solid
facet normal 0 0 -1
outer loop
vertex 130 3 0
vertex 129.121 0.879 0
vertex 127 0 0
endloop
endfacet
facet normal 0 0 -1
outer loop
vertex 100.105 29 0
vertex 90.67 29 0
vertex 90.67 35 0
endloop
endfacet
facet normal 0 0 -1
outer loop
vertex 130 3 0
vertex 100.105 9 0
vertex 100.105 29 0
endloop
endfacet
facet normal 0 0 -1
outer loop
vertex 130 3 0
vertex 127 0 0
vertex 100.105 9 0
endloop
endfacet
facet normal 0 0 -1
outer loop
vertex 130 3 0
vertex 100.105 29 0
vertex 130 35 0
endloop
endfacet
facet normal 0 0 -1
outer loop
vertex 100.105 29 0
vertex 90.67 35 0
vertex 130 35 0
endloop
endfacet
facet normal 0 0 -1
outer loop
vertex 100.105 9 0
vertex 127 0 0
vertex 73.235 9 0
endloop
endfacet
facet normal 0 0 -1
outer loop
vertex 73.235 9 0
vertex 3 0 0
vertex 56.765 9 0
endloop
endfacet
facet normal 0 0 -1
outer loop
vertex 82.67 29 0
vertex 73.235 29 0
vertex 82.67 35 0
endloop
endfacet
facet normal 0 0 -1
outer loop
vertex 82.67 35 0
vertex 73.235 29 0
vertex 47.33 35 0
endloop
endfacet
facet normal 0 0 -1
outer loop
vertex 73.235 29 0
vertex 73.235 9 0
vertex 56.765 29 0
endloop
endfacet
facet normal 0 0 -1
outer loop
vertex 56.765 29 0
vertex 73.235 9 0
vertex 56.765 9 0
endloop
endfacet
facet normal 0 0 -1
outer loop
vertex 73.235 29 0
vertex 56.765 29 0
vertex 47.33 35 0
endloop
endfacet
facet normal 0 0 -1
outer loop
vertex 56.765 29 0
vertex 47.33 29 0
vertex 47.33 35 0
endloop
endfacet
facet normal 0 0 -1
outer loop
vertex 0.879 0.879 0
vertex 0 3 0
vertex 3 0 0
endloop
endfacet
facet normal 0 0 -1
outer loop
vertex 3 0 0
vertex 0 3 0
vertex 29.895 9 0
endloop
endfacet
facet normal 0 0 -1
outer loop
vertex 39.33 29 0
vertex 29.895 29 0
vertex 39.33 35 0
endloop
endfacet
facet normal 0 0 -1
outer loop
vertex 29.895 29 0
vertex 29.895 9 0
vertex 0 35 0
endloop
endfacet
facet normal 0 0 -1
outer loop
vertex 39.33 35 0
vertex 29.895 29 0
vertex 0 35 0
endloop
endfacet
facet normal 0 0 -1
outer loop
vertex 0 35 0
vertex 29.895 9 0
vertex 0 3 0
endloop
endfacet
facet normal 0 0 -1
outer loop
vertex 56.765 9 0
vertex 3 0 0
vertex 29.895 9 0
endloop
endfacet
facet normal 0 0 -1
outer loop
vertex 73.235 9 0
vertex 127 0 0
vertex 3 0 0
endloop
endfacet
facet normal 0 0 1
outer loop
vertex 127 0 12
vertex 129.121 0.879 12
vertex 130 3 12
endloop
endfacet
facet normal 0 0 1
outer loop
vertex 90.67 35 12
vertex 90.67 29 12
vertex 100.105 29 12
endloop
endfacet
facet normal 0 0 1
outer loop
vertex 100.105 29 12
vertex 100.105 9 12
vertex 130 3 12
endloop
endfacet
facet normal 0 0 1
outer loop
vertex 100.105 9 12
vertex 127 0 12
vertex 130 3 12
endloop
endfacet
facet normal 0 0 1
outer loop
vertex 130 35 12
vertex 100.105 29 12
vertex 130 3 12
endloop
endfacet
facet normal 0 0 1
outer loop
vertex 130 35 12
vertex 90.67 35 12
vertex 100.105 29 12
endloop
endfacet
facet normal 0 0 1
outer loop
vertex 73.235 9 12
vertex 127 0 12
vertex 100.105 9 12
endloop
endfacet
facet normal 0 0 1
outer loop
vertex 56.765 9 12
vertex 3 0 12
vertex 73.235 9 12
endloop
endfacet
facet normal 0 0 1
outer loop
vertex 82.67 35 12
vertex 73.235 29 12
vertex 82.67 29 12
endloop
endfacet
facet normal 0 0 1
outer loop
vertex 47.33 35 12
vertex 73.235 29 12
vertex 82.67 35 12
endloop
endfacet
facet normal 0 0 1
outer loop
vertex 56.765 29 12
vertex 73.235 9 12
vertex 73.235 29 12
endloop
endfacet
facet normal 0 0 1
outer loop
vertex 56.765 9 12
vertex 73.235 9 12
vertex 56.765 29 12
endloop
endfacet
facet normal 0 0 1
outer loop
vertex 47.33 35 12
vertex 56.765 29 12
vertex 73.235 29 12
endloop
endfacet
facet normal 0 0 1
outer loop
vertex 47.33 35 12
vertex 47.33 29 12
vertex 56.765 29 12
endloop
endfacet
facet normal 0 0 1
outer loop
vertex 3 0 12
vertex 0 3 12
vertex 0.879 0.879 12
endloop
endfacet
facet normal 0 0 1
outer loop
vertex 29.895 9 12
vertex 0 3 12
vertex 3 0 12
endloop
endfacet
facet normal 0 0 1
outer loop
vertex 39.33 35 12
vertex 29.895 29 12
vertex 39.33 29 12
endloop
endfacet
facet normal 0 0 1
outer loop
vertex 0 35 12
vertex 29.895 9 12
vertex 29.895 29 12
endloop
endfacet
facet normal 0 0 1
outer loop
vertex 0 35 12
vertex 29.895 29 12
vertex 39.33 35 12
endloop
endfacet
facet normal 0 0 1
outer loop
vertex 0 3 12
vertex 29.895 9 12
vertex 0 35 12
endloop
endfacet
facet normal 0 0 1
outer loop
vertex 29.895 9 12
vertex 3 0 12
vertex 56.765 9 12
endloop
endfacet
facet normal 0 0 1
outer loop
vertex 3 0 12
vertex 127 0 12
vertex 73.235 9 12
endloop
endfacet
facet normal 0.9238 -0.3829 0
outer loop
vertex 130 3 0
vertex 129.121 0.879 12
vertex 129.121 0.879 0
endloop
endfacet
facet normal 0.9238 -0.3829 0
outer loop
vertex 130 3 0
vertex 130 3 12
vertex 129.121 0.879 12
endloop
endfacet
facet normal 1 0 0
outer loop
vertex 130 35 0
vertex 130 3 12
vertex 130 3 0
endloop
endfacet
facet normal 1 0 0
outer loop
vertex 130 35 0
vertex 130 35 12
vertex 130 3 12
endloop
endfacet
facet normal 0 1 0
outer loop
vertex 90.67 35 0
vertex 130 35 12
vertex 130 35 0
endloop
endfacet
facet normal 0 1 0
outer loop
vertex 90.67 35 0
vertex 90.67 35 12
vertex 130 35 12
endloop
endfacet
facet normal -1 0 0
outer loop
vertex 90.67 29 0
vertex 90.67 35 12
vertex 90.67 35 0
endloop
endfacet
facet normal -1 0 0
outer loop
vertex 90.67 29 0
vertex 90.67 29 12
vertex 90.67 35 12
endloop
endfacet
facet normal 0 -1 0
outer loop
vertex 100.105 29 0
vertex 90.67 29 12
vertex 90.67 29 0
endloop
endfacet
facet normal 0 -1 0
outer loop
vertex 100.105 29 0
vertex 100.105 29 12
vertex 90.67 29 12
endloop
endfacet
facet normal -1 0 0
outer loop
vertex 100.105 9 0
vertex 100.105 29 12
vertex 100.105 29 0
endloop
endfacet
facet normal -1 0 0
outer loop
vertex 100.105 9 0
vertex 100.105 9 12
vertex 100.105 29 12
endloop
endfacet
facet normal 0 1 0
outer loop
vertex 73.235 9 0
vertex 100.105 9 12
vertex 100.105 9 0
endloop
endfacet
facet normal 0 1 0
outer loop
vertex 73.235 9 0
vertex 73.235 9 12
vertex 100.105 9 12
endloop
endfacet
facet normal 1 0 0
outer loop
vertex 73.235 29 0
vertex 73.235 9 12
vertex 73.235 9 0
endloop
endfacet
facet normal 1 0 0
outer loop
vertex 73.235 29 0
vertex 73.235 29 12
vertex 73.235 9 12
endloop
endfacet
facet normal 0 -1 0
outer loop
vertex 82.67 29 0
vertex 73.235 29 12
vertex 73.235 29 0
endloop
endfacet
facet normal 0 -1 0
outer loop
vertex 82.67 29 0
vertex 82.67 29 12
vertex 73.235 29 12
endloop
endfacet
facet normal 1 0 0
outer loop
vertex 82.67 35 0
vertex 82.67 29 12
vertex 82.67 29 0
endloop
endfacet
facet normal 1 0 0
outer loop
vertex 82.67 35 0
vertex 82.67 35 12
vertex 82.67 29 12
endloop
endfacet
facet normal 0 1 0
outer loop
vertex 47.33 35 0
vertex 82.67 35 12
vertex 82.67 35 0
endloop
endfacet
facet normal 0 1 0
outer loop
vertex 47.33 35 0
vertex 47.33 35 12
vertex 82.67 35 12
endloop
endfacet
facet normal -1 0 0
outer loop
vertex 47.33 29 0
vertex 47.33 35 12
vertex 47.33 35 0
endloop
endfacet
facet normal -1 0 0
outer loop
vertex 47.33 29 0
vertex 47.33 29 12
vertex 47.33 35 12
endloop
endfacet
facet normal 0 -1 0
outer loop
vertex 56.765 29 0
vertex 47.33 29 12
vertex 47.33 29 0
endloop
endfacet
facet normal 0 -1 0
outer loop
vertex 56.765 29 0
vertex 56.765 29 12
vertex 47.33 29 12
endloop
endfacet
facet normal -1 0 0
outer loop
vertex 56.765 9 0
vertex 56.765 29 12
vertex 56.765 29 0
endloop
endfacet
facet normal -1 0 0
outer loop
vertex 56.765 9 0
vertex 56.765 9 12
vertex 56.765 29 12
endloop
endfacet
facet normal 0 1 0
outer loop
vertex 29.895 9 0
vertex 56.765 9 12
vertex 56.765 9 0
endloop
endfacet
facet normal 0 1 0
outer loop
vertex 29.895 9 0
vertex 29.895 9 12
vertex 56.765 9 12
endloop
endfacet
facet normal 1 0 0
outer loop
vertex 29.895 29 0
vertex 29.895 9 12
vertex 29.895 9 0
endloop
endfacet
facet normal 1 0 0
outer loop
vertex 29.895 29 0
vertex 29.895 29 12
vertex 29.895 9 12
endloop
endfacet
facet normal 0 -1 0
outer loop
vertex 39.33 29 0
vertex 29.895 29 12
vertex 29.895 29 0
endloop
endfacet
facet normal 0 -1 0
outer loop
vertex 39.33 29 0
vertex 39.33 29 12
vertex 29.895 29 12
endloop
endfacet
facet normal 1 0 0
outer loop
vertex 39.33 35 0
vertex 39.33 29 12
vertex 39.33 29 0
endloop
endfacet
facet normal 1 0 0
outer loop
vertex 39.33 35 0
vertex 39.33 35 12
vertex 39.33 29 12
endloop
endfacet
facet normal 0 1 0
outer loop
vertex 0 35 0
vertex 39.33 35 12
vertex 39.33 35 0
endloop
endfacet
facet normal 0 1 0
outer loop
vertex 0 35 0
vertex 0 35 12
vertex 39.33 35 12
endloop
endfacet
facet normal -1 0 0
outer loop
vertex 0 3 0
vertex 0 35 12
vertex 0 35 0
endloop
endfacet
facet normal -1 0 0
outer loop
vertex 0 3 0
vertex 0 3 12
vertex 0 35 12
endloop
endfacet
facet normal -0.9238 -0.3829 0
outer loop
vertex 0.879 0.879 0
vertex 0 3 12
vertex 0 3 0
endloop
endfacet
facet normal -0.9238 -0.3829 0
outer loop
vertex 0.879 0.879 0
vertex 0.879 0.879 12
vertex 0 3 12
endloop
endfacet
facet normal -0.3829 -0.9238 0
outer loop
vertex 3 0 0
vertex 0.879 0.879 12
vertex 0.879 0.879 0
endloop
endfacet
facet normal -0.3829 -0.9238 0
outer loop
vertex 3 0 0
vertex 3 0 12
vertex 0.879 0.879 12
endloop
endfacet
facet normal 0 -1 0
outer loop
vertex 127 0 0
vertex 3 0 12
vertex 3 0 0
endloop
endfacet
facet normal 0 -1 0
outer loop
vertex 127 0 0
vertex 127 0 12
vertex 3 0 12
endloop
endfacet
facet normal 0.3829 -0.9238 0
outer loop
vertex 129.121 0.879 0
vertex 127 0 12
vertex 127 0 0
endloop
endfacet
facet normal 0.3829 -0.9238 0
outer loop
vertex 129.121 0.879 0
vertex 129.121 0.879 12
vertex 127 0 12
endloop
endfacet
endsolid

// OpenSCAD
$fn = 32;

// ----------------------------------------------------------------------
// Window plate: 130 x 35 mm, 2 open windows
// ----------------------------------------------------------------------

// --- parameters (mm) ---
profile_height = 12;      // extrusion height
profile_points = 24;      // points of the closed outline

profile = [[0, 3], [0.879, 0.879], [3, 0], [127, 0], [129.121, 0.879], [130, 3], [130, 35], [90.67, 35], [90.67, 29], [100.105, 29], [100.105, 9], [73.235, 9], [73.235, 29], [82.67, 29], [82.67, 35], [47.33, 35], [47.33, 29], [56.765, 29], [56.765, 9], [29.895, 9], [29.895, 29], [39.33, 29], [39.33, 35], [0, 35]];  // single closed polygon, 24 points, counter clockwise

// --- the one profile operation ---
linear_extrude(height = profile_height) polygon(points = profile);
